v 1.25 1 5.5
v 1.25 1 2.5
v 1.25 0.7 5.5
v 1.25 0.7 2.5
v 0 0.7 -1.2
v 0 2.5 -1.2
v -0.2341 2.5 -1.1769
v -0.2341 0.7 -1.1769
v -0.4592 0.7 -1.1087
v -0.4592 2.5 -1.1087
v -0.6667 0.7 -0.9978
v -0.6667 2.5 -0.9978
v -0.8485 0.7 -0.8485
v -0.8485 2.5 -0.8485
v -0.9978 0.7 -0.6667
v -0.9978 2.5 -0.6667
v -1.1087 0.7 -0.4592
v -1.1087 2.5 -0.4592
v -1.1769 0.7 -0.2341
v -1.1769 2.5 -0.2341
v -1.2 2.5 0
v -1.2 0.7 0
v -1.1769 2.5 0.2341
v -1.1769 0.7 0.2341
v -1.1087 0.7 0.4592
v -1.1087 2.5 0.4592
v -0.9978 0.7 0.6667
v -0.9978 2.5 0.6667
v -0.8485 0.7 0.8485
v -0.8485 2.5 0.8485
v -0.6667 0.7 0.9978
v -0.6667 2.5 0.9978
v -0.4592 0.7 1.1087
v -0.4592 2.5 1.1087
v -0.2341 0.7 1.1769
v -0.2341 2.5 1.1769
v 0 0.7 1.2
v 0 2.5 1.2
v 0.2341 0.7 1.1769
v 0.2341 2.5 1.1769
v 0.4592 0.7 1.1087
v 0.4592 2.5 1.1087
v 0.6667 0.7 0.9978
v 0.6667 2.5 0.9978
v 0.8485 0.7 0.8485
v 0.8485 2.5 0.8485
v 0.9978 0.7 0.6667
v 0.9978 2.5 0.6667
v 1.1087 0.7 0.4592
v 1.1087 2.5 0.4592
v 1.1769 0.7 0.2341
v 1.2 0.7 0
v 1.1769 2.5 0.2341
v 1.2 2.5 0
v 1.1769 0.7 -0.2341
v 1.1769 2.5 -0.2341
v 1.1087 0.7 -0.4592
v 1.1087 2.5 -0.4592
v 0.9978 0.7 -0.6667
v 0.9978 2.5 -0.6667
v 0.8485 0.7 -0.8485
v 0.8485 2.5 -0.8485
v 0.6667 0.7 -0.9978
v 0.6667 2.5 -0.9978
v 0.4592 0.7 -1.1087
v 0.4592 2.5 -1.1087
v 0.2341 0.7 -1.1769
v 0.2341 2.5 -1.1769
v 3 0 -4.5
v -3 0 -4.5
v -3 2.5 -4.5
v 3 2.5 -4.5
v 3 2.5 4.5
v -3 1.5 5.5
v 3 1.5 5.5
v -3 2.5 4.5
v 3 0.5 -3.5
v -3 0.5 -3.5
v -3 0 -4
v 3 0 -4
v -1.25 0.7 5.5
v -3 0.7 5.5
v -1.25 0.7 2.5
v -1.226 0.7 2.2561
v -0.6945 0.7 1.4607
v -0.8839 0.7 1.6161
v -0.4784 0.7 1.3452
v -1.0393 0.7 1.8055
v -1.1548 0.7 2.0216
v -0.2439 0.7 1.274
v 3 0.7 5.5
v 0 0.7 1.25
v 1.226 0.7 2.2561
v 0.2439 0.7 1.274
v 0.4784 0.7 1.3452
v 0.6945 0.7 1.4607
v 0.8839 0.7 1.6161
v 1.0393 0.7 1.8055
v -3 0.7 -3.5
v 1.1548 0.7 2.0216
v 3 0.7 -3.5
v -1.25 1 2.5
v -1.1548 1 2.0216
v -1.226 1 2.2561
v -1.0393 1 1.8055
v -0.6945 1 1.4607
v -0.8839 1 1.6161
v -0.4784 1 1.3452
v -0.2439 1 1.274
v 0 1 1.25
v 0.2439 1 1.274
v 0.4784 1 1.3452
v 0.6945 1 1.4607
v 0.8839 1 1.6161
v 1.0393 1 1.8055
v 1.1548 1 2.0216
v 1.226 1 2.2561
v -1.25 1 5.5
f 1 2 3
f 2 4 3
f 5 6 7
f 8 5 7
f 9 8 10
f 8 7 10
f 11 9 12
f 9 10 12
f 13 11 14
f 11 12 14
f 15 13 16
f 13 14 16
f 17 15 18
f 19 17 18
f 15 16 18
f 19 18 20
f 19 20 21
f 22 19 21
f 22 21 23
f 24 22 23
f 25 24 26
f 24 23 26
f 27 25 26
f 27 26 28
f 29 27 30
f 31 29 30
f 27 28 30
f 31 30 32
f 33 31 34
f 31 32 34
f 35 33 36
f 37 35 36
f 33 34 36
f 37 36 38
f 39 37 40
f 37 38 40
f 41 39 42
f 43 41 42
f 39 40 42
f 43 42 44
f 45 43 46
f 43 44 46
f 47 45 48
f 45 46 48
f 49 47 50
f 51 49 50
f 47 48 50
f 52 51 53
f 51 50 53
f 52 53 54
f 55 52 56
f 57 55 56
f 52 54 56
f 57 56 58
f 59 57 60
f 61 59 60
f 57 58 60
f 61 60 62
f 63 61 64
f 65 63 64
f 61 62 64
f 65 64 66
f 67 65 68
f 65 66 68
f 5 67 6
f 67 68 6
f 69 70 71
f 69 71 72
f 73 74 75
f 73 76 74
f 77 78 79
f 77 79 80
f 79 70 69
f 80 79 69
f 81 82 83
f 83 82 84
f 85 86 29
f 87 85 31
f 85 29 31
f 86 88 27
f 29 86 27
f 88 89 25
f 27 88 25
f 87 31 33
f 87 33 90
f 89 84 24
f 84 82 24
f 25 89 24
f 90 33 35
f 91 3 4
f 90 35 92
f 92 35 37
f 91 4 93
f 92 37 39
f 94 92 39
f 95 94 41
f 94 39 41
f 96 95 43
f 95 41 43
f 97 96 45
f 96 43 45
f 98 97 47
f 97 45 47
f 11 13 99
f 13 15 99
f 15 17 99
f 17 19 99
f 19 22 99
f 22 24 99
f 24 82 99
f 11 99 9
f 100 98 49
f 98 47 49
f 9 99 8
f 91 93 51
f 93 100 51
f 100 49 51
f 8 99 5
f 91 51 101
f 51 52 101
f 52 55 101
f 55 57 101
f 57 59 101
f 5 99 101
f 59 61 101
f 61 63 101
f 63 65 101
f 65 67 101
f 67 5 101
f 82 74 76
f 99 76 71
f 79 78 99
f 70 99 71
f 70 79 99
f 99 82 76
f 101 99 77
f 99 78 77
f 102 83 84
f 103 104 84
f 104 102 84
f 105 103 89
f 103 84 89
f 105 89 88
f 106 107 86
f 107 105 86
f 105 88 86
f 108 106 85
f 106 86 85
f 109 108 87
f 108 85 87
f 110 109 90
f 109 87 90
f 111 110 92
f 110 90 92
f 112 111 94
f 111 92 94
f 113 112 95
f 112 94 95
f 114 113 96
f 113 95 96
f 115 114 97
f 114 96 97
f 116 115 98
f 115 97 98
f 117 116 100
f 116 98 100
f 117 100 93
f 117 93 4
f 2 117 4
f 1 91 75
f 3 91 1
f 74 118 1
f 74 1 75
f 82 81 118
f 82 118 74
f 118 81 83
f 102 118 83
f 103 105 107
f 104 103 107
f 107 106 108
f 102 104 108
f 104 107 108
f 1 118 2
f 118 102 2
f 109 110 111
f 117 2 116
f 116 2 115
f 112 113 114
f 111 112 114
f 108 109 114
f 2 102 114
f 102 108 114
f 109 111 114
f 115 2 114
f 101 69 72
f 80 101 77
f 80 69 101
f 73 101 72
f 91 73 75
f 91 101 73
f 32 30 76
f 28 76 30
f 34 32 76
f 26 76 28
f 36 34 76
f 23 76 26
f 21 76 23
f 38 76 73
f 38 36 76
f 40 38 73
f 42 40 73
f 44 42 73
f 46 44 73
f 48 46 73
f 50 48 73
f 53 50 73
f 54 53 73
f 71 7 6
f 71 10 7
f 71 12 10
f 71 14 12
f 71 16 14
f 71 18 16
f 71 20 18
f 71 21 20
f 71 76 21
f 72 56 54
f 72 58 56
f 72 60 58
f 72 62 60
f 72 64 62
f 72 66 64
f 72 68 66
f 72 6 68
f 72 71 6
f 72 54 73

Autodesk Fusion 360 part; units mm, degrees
sketch "Sketch1" plane through (0, 0, 0) normal (0, 1, 0) x (1, 0, 0)
  line L0 (-3, 4.5) -> (3, 4.5)
  line L1 (3, 4.5) -> (3, -5.5)
  line L2 (3, -5.5) -> (-3, -5.5)
  line L3 (-3, -5.5) -> (-3, 4.5)
  line L4 (-1.25, -5.5) -> (-1.25, -2.5)
  arc A0 (1.25, -2.5) -> (-1.25, -2.5) centre (0, -2.5) ccw
  line L5 (1.25, -2.5) -> (1.25, -5.5)
  line L6 (-3, 3.5) -> (3, 3.5)
  line L7 (0, 0) -> (0, -2.5) construction
  dimension "d2" = 2.5
  dimension "d3" = 3
  dimension "d4" = 1
  dimension "d5" = 10
  dimension "d6" = 2.5
  dimension "d7" = 6
extrude "Extrude1" add sketch "Sketch1" along normal blind 2.5
extrude "Extrude2" cut sketch "Sketch1" along normal blind 0.7 contours L1 L2 L3 L4 A0 L5 L6 | L2 L4 A0 L5
extrude "Extrude3" cut sketch "Sketch1" along normal blind 1 contours L2 L4 A0 L5
hole "Hole1" at (0, 0, 0) direction (0, 1, 0) diameter 2.4 depth 5 tip angle 118
chamfer "Chamfer1" distance 0.5 angle 45 1 edges at (0, 0, -3.5)
chamfer "Chamfer2" distance 1 angle 45 1 edges at (0, 2.5, 5.5)
